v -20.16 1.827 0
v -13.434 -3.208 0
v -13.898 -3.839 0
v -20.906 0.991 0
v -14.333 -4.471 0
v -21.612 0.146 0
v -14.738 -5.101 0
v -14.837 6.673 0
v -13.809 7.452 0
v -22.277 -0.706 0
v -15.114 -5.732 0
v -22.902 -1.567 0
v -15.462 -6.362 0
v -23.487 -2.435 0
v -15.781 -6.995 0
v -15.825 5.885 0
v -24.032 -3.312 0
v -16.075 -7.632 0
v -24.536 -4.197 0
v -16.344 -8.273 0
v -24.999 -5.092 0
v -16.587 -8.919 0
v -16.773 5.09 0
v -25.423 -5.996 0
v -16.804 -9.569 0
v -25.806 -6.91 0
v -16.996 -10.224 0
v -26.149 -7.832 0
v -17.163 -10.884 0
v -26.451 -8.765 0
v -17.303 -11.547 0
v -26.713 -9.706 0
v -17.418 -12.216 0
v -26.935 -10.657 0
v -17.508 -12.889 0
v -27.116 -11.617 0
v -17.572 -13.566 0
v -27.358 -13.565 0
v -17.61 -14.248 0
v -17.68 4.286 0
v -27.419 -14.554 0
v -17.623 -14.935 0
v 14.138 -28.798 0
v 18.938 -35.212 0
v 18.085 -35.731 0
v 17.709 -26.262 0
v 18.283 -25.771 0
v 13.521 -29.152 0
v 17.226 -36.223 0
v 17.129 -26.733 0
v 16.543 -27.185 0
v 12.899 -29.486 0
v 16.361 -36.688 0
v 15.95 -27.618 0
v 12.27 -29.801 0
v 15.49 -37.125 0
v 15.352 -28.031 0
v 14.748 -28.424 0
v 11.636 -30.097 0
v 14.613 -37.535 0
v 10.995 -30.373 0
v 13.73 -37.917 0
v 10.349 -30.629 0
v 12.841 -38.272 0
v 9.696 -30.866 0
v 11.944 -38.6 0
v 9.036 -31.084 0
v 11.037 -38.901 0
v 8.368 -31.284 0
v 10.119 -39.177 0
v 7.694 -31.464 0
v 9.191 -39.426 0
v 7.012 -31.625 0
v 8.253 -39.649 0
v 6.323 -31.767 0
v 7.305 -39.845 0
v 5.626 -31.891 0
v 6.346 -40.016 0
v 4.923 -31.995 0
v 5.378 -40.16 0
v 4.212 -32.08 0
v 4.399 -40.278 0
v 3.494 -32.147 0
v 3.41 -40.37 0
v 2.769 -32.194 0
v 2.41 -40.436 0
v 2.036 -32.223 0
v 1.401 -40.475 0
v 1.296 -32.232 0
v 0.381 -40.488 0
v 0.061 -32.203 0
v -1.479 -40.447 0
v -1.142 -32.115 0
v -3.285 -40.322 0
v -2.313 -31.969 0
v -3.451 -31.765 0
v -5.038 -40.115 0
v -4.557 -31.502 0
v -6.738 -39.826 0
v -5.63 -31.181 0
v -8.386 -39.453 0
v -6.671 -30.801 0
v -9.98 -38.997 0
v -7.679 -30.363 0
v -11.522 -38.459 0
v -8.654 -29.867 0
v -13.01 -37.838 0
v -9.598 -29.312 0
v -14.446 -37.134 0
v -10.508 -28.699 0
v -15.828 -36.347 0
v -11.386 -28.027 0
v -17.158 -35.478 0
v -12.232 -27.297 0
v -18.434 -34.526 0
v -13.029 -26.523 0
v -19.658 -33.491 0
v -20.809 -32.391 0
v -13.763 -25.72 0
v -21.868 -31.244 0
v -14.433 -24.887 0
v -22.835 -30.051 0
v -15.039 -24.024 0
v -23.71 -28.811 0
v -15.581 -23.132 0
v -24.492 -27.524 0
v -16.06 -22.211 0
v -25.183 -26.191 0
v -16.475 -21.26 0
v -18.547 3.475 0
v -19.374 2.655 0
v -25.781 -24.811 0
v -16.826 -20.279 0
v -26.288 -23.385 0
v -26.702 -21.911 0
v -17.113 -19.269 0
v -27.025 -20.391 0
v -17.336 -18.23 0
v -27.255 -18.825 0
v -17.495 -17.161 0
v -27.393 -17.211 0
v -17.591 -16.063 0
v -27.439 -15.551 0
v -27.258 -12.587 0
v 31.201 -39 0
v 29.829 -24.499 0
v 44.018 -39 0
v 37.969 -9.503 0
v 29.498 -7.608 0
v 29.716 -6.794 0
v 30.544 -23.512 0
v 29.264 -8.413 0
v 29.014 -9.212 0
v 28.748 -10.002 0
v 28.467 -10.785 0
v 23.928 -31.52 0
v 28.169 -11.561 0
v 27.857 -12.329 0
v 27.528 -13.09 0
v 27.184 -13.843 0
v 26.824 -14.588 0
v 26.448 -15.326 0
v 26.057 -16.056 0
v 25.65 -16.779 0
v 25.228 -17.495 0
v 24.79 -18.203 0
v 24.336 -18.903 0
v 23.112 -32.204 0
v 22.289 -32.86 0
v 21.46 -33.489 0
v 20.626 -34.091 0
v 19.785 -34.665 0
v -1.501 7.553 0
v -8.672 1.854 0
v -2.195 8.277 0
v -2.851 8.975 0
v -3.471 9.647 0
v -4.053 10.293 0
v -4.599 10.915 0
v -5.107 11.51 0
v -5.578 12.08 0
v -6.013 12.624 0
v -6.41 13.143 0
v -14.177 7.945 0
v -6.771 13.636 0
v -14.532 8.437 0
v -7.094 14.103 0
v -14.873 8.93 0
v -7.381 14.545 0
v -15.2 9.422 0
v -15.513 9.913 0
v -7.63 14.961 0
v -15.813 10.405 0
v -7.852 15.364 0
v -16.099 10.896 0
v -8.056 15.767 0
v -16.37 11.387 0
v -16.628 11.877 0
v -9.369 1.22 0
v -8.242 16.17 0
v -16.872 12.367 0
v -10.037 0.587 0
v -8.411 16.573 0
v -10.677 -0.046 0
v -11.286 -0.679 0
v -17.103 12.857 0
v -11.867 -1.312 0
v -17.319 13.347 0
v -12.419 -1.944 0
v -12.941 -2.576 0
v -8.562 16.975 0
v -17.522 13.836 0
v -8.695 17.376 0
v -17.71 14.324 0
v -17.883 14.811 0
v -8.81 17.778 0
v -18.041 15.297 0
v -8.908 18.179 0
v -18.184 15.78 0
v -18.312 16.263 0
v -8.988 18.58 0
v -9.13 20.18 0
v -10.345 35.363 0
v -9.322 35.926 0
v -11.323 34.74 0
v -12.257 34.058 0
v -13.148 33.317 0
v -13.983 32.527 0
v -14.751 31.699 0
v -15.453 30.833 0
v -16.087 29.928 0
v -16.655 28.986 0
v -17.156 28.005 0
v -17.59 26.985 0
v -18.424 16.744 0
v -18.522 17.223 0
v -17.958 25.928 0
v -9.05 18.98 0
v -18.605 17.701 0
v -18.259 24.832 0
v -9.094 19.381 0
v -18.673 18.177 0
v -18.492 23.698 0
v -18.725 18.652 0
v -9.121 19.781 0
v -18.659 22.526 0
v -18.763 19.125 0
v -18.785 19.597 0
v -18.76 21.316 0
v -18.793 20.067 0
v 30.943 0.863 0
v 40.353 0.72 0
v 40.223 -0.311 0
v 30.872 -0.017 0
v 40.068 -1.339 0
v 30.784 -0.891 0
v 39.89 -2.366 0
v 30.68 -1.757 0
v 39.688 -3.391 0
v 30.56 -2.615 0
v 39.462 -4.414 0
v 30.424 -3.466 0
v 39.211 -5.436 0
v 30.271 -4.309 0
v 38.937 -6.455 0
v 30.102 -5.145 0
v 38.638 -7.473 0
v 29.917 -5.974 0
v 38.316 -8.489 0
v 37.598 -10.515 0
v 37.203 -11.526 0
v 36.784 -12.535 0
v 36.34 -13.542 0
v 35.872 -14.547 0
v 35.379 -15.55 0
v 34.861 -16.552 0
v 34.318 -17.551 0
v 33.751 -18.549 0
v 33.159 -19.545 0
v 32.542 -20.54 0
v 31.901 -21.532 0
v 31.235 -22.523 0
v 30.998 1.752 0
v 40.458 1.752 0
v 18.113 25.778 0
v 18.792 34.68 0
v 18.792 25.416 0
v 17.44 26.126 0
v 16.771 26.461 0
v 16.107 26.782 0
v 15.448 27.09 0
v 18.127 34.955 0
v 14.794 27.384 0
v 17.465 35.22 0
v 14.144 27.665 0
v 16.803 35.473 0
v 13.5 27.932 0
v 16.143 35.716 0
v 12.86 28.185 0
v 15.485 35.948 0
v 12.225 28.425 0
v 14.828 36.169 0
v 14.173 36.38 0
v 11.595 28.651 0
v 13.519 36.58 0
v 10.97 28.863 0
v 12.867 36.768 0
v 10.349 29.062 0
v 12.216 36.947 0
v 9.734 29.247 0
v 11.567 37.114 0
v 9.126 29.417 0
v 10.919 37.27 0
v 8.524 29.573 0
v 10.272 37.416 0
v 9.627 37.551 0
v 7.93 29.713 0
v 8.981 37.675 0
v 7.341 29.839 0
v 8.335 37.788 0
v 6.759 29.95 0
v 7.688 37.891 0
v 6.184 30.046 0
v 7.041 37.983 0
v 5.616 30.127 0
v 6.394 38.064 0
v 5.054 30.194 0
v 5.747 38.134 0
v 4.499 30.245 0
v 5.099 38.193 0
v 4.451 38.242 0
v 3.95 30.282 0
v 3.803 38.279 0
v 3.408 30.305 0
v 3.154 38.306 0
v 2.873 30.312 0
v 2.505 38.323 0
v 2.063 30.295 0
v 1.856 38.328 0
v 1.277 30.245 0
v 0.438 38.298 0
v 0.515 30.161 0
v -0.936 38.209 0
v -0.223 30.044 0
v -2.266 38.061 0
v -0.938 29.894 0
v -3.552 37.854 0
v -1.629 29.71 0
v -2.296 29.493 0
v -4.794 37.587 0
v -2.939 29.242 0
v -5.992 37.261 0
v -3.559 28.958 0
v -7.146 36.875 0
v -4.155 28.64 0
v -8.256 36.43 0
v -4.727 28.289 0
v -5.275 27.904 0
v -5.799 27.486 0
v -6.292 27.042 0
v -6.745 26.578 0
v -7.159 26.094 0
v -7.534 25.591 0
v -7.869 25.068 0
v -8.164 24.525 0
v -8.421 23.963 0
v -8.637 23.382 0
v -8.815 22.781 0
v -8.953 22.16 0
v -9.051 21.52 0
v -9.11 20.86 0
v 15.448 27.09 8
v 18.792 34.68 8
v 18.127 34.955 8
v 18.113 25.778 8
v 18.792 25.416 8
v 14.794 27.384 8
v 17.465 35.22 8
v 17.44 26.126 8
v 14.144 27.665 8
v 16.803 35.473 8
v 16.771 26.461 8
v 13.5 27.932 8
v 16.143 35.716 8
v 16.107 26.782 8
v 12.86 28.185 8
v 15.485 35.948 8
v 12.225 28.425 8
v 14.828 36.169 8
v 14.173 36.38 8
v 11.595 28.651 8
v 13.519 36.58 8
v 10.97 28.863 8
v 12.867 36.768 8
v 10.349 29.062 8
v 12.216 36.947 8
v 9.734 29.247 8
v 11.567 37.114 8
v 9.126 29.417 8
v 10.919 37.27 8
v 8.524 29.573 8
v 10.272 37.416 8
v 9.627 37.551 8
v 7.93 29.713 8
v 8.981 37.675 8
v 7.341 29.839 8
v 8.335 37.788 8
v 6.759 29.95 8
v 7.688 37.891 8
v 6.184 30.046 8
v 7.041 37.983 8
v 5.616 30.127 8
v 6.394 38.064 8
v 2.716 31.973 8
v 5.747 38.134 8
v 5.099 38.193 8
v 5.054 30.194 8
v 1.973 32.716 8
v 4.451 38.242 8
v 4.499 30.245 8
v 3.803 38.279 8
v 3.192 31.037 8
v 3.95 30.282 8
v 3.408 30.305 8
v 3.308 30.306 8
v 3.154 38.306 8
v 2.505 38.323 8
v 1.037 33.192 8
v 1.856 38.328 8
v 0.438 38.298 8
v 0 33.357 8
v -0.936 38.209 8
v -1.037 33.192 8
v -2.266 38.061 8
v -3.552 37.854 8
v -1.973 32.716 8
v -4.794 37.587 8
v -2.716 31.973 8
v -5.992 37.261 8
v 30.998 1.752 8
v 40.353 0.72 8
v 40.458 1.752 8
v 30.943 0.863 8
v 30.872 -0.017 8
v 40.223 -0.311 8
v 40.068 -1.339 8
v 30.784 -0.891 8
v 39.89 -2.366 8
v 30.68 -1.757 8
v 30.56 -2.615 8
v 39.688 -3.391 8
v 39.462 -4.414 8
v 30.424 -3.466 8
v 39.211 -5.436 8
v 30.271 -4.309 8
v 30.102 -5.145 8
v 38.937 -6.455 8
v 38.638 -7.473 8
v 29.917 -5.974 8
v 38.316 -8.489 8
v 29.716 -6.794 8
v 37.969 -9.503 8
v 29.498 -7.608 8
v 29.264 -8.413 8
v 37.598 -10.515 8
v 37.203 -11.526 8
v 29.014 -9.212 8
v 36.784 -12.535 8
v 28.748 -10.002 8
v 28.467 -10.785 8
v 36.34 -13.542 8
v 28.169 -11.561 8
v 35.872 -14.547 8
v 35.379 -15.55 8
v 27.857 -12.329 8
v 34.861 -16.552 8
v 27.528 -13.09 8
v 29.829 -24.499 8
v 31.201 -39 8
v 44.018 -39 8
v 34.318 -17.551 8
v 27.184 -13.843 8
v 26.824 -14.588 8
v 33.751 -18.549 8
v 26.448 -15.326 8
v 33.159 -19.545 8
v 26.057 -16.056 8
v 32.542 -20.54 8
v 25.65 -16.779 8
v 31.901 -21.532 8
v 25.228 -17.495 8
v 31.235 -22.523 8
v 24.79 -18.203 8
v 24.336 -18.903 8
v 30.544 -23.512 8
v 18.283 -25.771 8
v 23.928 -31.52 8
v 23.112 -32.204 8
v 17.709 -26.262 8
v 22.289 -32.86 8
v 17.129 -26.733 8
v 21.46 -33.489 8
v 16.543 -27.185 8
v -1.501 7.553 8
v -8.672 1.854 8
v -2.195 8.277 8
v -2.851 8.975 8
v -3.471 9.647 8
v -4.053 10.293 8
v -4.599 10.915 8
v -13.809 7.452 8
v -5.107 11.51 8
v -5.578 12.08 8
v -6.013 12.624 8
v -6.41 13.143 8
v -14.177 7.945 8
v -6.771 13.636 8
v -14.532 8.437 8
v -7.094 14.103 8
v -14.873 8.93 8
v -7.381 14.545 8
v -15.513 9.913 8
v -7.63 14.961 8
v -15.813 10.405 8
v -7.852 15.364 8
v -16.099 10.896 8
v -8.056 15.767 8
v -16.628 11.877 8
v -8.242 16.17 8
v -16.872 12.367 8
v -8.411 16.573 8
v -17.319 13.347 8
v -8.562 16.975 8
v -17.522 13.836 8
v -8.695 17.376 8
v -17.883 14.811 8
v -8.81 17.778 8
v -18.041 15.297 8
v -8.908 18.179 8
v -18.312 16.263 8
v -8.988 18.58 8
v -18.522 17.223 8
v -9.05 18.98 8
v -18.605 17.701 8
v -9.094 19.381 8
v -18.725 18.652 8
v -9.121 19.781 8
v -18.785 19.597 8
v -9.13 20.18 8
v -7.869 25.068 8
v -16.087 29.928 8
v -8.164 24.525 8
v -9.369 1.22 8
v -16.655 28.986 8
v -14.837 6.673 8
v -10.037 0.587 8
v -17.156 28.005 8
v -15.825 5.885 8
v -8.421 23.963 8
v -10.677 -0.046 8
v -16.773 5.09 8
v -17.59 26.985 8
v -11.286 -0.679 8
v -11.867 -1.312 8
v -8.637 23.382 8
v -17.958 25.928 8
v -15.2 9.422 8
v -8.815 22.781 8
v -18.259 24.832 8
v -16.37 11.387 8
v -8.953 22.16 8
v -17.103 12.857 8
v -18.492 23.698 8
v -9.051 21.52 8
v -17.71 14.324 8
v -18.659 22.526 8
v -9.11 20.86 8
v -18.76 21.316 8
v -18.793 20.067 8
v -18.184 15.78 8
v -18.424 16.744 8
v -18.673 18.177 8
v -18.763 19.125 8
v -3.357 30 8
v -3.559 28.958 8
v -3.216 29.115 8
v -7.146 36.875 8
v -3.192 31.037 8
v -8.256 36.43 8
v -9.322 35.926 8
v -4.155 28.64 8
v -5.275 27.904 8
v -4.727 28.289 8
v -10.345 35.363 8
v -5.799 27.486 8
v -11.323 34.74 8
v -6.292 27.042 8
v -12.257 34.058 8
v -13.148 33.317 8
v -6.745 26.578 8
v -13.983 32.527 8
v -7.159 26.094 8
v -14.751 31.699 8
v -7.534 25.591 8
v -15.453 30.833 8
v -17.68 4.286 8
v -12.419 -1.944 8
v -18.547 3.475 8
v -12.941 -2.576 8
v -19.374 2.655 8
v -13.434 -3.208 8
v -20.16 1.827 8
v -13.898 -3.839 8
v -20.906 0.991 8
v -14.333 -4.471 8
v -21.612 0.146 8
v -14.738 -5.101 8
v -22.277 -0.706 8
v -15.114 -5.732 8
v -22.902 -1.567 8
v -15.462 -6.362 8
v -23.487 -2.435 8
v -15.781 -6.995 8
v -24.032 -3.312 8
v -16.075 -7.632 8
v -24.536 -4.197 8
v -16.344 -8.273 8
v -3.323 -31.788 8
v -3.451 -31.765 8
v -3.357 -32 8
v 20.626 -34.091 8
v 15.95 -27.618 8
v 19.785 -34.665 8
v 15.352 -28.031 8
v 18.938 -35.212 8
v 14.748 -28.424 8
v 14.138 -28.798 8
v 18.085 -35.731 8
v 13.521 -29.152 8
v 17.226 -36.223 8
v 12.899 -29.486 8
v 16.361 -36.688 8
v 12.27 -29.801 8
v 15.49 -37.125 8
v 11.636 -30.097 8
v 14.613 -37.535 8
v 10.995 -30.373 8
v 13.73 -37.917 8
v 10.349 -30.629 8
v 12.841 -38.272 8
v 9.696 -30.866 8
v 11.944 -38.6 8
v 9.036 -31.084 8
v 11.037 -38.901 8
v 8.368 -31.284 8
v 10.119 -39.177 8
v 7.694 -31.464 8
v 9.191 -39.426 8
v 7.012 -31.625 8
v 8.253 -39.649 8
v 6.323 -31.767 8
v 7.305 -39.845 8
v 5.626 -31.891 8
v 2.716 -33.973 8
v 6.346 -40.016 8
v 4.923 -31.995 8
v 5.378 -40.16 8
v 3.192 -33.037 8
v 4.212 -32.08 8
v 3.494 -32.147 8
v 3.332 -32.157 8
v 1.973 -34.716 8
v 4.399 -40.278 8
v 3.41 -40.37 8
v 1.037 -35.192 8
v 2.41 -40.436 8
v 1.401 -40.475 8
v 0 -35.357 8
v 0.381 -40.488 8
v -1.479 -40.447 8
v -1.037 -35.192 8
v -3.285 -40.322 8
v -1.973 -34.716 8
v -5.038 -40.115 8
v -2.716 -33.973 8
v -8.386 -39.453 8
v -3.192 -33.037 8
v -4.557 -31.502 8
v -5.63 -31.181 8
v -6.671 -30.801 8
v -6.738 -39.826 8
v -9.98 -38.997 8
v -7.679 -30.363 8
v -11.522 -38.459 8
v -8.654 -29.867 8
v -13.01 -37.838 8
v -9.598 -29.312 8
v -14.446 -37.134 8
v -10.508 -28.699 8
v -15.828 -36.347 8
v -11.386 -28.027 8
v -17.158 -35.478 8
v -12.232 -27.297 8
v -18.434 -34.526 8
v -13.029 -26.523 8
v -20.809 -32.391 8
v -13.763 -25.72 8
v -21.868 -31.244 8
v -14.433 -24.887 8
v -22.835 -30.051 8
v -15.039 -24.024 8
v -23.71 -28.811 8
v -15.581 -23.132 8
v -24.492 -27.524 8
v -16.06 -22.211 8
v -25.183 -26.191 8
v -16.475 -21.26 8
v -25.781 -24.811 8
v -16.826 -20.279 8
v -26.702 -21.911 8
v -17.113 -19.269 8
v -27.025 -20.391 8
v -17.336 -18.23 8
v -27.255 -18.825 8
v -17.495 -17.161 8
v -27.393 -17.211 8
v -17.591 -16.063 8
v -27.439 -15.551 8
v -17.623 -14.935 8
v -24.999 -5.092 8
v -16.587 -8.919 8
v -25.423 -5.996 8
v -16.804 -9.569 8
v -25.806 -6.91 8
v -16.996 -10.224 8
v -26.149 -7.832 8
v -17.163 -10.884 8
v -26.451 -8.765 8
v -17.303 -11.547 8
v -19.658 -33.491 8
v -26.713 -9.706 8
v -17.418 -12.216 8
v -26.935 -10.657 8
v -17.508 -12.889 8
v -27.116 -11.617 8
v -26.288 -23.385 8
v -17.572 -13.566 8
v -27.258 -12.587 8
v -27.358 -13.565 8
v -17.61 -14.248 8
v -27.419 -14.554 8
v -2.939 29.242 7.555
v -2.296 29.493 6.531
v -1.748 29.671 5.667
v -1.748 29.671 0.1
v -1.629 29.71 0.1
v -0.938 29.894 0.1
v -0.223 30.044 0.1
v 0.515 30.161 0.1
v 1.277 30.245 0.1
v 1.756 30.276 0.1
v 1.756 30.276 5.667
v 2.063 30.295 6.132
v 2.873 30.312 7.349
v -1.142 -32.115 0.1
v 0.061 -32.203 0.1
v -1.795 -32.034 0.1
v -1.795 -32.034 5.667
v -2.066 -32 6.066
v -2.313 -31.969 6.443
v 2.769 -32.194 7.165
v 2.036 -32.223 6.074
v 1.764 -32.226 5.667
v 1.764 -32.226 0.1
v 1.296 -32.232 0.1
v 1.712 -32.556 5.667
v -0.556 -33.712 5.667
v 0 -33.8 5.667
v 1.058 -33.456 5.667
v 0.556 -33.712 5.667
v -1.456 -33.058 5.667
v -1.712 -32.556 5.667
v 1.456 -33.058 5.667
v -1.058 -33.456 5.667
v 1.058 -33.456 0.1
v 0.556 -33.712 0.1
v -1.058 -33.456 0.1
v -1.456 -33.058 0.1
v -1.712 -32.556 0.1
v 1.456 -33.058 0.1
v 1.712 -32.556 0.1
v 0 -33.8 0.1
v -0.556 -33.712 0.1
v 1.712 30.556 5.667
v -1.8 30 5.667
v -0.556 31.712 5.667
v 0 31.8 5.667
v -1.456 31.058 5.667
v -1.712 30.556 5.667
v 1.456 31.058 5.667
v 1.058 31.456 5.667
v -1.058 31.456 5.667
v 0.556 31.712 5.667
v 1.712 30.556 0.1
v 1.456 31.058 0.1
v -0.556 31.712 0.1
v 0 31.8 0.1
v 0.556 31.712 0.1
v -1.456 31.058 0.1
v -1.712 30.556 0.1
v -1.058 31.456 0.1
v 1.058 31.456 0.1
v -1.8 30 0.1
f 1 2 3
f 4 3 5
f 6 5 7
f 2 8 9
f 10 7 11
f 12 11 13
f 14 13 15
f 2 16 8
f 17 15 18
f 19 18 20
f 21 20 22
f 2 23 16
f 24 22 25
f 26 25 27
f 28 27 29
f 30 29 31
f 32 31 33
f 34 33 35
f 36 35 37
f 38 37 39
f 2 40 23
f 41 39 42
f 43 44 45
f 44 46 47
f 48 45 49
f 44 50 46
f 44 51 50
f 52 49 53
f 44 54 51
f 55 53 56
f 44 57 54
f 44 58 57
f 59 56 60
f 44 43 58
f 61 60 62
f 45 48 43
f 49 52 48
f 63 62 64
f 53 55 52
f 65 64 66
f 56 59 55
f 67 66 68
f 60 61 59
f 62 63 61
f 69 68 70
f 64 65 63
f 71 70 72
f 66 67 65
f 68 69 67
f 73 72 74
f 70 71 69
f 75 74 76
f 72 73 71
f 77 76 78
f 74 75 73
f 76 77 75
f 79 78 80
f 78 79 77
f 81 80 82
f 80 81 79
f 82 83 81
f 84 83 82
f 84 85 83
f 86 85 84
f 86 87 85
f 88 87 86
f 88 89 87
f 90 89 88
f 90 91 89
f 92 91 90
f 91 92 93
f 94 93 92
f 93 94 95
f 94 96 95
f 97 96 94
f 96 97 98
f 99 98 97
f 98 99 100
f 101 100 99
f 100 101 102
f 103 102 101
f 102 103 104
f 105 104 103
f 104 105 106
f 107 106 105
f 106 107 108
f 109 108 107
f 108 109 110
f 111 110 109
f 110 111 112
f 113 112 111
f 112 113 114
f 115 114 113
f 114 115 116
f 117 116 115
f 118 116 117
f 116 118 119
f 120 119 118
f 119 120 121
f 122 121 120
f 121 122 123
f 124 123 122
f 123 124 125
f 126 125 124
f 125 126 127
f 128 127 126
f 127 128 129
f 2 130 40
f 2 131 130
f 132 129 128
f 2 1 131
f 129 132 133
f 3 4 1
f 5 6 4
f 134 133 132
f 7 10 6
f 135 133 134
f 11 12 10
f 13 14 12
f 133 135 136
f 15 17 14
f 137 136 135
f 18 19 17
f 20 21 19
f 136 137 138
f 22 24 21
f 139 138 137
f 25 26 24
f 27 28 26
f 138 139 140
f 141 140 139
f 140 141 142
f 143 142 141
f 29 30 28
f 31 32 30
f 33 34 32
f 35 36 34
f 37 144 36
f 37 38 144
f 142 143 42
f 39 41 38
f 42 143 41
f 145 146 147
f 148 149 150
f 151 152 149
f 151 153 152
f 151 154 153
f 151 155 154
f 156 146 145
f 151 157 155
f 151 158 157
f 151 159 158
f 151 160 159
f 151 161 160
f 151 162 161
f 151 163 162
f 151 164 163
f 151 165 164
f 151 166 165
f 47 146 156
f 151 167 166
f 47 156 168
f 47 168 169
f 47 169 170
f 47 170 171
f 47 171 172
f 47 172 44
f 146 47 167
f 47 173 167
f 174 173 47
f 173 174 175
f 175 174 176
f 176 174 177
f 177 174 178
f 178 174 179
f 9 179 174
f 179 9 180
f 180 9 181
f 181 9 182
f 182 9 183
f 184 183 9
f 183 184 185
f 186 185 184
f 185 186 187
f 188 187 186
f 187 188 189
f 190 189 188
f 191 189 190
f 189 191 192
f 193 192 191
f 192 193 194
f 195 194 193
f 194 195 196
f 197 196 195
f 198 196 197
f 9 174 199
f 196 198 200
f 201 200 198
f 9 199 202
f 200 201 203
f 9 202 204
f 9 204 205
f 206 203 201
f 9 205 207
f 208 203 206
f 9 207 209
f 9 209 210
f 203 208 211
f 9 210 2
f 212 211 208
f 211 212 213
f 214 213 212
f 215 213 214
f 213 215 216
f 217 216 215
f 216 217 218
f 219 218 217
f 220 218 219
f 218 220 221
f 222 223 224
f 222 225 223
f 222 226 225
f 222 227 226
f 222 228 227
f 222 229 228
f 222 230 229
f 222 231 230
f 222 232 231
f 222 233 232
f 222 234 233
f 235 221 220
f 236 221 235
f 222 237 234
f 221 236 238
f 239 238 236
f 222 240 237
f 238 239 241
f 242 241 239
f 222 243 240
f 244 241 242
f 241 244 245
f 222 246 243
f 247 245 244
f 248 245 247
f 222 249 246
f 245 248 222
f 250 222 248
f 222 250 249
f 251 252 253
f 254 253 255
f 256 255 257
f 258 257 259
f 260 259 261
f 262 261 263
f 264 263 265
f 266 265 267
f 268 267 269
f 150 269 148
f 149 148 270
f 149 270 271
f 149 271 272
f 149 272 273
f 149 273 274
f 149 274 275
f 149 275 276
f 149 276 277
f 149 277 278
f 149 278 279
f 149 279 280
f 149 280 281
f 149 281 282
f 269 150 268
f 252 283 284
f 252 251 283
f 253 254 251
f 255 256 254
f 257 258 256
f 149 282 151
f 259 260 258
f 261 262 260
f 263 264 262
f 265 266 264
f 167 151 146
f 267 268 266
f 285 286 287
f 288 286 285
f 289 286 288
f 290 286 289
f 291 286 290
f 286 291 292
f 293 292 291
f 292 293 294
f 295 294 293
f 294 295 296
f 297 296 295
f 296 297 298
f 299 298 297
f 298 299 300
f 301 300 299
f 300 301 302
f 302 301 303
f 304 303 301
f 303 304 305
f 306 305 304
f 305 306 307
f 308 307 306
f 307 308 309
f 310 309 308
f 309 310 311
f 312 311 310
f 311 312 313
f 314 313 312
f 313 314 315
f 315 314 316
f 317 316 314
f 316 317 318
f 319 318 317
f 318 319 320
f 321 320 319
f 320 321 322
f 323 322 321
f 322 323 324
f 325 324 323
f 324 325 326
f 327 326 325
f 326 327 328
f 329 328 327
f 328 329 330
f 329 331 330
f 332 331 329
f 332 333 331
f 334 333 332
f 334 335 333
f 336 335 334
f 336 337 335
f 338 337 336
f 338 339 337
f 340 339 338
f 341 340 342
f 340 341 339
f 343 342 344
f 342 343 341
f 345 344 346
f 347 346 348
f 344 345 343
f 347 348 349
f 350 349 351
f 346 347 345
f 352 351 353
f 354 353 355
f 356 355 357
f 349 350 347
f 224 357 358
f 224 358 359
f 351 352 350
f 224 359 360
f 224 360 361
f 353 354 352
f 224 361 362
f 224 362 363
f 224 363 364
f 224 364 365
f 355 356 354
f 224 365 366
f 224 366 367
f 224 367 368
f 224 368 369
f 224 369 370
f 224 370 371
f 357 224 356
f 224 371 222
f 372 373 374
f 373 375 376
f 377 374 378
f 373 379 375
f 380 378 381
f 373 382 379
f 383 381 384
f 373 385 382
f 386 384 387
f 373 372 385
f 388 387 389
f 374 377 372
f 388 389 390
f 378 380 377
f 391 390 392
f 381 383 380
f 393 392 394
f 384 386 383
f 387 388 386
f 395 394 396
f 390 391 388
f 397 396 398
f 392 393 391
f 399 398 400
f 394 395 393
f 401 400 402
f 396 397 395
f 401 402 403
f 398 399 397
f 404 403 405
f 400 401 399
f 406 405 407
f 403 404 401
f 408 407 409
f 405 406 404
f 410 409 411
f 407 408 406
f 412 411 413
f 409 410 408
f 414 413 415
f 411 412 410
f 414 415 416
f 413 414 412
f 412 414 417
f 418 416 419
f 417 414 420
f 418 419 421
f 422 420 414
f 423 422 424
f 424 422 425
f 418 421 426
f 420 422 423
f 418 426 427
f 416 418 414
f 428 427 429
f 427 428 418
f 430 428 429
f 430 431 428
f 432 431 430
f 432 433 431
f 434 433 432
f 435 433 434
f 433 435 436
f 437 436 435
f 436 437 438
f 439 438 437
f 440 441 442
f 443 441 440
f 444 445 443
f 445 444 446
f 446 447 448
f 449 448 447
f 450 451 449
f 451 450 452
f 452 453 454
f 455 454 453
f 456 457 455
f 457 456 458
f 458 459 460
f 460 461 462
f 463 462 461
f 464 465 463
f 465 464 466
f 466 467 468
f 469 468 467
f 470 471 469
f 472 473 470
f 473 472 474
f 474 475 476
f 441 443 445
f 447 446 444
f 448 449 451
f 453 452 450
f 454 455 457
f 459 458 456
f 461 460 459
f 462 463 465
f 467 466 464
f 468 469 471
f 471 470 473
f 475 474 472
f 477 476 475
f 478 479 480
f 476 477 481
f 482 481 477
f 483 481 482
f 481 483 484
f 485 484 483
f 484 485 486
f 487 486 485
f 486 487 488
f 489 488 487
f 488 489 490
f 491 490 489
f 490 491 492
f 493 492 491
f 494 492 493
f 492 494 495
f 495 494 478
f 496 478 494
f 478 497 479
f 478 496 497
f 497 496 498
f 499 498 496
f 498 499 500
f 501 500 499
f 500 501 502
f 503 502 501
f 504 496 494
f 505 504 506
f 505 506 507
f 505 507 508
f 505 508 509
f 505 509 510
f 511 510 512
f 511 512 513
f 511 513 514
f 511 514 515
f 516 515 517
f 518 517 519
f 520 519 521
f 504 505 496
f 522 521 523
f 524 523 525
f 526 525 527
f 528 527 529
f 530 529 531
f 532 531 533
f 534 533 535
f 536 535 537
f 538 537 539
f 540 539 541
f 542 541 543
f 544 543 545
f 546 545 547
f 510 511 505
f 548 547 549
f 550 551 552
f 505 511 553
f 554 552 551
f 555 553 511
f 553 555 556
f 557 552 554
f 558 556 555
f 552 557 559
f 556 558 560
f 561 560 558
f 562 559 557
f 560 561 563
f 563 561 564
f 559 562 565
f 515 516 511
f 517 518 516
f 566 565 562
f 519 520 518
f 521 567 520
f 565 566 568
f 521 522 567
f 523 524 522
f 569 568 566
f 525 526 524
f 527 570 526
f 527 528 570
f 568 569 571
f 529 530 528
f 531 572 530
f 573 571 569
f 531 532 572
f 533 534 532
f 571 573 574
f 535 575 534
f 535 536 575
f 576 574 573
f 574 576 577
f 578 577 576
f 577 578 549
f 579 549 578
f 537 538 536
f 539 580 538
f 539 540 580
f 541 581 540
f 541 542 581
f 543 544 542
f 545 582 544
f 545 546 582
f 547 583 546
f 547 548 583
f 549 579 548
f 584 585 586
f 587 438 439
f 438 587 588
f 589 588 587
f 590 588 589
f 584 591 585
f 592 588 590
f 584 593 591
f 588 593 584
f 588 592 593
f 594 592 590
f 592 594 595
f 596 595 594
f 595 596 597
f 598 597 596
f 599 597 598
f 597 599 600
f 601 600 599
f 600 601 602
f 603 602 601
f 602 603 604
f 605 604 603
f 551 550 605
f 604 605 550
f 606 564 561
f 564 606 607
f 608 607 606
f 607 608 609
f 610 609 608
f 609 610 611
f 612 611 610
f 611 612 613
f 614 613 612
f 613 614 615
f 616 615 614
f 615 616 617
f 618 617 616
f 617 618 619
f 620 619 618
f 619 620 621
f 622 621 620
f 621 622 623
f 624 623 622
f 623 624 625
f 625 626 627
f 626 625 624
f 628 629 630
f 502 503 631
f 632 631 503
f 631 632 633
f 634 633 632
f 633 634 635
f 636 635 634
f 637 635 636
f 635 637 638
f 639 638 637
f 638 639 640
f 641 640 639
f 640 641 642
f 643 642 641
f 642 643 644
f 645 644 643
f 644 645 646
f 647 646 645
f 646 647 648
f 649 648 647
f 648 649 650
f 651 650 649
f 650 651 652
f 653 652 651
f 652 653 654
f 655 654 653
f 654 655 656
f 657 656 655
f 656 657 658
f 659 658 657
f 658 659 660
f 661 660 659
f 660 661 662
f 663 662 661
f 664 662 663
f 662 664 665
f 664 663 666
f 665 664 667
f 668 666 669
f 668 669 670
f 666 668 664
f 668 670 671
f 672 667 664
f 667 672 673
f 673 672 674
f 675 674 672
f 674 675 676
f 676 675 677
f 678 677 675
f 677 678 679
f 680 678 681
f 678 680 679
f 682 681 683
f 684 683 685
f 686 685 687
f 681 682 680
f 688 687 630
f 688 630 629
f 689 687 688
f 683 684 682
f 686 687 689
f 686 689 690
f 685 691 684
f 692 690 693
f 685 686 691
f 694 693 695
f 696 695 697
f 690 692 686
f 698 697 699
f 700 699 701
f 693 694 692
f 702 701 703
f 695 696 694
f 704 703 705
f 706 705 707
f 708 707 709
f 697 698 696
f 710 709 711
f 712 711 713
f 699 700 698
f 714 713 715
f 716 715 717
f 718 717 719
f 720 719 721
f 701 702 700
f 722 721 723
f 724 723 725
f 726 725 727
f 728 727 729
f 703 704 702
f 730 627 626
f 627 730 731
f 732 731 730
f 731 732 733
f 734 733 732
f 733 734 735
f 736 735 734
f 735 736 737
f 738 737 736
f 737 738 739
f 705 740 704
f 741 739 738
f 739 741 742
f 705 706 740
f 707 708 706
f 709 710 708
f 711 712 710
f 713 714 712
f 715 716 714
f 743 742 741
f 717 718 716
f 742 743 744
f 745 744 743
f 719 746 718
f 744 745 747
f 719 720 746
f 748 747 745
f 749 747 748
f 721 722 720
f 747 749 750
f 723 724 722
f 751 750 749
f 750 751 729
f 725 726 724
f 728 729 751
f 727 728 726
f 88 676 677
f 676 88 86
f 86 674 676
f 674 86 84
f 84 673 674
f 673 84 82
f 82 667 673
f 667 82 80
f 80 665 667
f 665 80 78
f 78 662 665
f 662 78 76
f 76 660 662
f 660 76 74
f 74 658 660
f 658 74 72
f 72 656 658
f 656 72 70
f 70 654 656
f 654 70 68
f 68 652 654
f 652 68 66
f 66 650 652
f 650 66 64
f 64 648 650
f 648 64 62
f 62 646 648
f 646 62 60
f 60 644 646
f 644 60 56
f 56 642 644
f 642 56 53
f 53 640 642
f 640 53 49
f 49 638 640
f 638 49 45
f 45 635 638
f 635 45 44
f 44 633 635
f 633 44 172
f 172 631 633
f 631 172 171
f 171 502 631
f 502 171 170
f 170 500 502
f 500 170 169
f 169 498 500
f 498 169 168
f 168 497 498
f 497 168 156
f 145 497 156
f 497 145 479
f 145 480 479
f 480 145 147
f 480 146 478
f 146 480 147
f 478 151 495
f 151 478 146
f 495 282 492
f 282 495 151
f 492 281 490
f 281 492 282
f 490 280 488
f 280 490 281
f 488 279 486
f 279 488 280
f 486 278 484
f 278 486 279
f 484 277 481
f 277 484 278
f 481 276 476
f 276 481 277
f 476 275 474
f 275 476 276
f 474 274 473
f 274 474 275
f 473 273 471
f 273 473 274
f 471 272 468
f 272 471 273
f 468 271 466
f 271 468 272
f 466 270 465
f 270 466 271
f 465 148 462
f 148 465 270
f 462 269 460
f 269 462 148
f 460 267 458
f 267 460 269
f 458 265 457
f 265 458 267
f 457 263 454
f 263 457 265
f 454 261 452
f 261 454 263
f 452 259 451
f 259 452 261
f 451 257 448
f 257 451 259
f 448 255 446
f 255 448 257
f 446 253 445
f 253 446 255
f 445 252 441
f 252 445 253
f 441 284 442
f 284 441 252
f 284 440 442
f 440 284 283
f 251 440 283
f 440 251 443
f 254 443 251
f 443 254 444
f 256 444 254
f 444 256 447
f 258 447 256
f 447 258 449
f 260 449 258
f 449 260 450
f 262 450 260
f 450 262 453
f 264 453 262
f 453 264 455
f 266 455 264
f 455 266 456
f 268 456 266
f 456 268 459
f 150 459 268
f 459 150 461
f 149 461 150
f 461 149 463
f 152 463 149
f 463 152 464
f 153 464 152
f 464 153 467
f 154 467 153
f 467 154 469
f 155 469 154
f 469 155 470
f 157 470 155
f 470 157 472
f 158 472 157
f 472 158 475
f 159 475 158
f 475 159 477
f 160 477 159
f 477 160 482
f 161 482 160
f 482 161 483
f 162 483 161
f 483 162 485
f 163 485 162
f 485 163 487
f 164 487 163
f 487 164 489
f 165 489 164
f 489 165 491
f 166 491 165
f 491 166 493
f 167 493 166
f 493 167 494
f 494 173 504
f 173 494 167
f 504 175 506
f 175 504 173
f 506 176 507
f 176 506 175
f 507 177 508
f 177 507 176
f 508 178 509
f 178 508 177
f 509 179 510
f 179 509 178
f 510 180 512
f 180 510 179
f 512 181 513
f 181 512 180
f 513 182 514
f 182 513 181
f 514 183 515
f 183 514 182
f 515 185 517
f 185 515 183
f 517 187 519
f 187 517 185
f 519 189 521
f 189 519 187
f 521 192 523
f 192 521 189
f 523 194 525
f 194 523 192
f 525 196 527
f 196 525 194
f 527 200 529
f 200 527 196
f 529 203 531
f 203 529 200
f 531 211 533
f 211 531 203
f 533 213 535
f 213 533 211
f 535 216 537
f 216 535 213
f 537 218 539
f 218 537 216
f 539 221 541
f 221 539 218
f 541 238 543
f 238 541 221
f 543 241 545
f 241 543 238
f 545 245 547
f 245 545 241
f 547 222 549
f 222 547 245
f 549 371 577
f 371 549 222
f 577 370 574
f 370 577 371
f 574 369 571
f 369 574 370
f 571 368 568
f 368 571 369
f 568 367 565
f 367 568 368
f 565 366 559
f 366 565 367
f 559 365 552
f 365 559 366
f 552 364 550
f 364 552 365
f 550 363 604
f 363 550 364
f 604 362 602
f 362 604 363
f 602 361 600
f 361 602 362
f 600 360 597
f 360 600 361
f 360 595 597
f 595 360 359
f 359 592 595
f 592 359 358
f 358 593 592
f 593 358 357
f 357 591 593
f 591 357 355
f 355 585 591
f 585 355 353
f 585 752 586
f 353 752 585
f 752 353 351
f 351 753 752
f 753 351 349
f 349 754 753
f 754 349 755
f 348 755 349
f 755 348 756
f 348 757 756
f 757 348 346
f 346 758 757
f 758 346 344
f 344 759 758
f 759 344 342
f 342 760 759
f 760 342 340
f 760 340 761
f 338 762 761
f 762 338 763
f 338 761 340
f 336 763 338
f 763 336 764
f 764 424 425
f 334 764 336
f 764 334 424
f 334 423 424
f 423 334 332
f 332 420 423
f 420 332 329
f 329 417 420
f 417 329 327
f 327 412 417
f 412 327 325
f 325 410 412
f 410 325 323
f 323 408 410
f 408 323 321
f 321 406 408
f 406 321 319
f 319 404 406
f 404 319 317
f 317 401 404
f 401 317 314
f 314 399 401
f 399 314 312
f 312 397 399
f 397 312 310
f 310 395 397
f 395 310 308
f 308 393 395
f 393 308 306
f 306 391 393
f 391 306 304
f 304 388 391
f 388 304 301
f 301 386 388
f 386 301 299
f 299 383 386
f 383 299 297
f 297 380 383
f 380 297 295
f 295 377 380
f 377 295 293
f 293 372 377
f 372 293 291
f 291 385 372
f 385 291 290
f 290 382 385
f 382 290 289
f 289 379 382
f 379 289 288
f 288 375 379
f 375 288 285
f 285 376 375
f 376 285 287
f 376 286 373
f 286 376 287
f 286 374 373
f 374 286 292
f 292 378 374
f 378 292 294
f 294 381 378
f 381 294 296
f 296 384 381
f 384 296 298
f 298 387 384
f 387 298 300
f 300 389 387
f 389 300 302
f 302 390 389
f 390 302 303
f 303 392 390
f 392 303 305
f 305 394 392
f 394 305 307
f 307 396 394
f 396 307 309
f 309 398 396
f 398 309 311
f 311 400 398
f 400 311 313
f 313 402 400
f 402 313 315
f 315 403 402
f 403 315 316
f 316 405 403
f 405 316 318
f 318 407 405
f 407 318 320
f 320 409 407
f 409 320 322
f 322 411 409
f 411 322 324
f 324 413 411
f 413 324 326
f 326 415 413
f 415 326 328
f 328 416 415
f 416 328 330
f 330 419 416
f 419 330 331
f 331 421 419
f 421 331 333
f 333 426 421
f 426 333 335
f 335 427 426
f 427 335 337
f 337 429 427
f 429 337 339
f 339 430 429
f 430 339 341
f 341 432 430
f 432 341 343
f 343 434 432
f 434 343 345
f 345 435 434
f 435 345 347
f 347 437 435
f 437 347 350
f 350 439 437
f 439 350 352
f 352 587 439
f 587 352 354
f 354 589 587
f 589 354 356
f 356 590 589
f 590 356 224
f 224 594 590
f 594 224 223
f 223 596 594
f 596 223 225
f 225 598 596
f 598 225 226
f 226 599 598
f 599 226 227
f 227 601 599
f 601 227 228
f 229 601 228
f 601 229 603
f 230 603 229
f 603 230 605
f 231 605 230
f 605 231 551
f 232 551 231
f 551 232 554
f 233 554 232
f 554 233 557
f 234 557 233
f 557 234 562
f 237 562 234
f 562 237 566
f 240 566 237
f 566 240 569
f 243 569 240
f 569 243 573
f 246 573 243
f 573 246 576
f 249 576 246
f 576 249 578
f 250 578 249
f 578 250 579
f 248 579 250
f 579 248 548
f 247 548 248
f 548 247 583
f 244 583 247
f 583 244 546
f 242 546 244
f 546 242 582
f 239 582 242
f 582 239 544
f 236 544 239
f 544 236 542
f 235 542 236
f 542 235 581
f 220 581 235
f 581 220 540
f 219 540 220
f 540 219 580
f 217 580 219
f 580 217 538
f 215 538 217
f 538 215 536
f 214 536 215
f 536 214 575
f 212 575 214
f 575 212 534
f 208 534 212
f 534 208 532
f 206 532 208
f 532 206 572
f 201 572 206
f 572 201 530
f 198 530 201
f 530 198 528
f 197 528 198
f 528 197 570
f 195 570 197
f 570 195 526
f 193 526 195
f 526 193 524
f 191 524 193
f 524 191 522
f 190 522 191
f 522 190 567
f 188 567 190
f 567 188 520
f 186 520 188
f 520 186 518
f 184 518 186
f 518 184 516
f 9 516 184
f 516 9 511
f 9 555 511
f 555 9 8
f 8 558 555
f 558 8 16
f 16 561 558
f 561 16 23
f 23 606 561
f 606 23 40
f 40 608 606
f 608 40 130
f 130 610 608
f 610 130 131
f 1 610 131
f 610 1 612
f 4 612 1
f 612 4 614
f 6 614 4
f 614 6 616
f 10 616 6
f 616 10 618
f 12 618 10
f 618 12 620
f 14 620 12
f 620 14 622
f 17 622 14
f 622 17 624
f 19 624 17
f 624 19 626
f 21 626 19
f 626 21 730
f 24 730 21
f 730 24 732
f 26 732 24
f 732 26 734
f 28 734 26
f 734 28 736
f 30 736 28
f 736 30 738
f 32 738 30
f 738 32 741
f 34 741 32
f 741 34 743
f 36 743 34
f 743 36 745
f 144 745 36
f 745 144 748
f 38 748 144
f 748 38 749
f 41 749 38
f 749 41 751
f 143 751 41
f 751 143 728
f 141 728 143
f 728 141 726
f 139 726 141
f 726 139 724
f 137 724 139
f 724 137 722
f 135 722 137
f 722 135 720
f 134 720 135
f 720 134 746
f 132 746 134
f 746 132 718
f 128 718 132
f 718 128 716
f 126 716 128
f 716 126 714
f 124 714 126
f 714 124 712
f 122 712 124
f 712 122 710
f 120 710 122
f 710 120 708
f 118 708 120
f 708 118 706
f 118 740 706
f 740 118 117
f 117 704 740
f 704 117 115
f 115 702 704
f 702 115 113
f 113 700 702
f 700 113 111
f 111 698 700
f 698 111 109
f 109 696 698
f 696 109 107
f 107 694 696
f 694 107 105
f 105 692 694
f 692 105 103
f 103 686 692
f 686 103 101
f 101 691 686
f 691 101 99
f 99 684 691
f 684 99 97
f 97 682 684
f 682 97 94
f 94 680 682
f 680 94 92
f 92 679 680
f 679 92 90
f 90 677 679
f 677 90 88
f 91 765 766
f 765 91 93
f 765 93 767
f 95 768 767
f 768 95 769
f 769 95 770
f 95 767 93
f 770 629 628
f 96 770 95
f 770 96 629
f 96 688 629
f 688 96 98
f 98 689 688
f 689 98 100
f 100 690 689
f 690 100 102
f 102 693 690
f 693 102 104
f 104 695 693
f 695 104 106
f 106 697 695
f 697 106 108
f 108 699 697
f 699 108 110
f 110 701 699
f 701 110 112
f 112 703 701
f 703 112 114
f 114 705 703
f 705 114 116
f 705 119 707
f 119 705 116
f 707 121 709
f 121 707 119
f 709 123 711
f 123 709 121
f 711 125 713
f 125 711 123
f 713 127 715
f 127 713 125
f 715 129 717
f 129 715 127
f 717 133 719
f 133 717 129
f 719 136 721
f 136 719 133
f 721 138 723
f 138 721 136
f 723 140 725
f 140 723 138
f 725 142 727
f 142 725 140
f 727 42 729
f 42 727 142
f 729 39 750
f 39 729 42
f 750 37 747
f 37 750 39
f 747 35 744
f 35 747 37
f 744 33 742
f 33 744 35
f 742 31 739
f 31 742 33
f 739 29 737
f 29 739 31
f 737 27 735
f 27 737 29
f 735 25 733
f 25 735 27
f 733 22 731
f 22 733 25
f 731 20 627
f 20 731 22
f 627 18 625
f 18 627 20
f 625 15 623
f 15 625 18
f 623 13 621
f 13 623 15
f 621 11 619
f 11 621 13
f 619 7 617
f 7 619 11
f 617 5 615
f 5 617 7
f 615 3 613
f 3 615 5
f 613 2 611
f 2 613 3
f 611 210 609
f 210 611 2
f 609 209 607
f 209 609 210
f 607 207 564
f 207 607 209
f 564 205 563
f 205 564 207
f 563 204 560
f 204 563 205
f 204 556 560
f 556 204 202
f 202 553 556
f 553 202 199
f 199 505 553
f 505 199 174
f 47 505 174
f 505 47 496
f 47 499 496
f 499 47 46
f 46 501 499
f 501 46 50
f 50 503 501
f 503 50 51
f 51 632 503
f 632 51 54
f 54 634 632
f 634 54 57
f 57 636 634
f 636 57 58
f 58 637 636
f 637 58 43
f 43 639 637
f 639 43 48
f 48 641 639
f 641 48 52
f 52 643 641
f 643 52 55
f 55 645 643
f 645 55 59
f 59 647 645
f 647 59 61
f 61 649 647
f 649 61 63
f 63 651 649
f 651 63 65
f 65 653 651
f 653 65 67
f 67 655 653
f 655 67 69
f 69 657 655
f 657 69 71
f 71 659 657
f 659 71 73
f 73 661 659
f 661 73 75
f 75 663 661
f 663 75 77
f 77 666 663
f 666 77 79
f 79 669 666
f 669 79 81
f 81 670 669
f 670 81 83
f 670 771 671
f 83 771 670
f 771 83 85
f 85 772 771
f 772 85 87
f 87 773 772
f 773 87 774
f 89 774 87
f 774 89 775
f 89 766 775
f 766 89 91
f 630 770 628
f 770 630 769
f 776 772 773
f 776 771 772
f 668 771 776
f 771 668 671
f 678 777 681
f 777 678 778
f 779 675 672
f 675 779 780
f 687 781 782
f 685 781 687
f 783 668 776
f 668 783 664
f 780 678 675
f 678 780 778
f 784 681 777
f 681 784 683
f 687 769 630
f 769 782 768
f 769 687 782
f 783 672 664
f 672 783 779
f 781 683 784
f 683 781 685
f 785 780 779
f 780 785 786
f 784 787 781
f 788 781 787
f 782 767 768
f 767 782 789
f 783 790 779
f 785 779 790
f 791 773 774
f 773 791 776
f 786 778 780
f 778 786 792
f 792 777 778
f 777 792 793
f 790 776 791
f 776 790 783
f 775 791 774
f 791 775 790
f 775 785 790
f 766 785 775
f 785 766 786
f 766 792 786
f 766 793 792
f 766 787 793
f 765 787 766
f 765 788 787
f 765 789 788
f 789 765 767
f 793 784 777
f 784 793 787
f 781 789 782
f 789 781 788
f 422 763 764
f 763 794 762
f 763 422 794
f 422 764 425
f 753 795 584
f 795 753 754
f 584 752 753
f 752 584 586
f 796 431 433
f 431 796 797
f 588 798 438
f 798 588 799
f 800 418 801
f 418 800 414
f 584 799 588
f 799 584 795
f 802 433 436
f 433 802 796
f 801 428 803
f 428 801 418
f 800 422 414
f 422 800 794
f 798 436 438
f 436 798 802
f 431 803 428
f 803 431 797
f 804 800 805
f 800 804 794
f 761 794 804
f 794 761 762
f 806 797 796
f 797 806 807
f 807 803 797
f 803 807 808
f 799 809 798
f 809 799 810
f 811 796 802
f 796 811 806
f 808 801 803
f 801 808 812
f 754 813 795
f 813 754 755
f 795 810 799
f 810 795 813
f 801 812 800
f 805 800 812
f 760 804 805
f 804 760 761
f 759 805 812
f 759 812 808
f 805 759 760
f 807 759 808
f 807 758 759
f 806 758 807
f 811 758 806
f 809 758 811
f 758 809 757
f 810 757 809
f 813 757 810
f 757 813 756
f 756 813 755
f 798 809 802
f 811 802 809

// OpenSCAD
// Street Numbers for 3D printing
// Charles Tilford, 2019
// License: CC BY-NC-SA 4.0
//   https://creativecommons.org/licenses/by-nc-sa/4.0/

char="&";     // The number/letter to print

// Units are in mm, except for height of letter

// How many inches high should letter be?
inchesHigh=3;
// How thick/deep should letter be (mm)?
depth=8;

// Character coordinates just center the letter
charX=-34;    // Character X coord
charY=-39;    // Character Y coord
topScrew=30;  // Top screw Y coord
botScrew=-32; // Bottom screw Y coord
height=8;     // Thickness of character
// Screw dimensions. Default presumes
// #6 sheet metal screw
screwWid=3.6; // Width of screw shaft
screwTop=6.78;// Width of screw head
screwCon=5.08;// Height of head 'cone'

// Font to print in. Your system needs this
// installed, of course. If changed the hole
// positions almost certainly need to be
// changed, and maybe charX/charY.
fName="Open Sans Extrabold";
// https://fonts.google.com/specimen/Open+Sans
// Designer: Steve Matteson

// Thin floor below holes. My printer was
// struggling to have the hole 'border' stick
// to the stage. Just drill/screw thru it.
holeFloor=0.1; 

// ==========================================
// ===== All values below are auto-calculated
// ==========================================

// Scaled values
scaleFactor=inchesHigh / 3;
cX=charX * scaleFactor;
cY=charY * scaleFactor;
tS=topScrew * scaleFactor;
bS=botScrew * scaleFactor;
// Where do we start drawing screw head cone?
oS=depth - (screwCon-.05);

difference() {
  // We use difference() to punch out the screw holes
  // in the character
    
  // The character itself, 8mm thick
  translate([cX,cY,0])
    linear_extrude(height=depth, scale=1)
    text(char, size=(75*scaleFactor),
         $fn=100, font=fName);
    
  // Bottom screw hole
  translate([0,bS,oS]) color("red")
    cylinder(h=screwCon, d2=screwTop,
             d1=0, $fn=20);
   translate([0,bS,holeFloor])
    cylinder(h=20, d=screwWid, $fn=20);
    
  // Top screw hole
  translate([0,tS,oS]) color("red")
    cylinder(h=screwCon, d2=screwTop,
             d1=0, $fn=20);
  translate([0,tS,holeFloor])
    cylinder(h=20, d=screwWid, $fn=20);
}

// Colors are just to aid visualization of
// void spaces. $fn is "featuer number", ie how
// many polygons are devoted to object. The values
// above should be near your printing limit anyway.

// Developed in OpenSCAD
//    https://www.openscad.org/
